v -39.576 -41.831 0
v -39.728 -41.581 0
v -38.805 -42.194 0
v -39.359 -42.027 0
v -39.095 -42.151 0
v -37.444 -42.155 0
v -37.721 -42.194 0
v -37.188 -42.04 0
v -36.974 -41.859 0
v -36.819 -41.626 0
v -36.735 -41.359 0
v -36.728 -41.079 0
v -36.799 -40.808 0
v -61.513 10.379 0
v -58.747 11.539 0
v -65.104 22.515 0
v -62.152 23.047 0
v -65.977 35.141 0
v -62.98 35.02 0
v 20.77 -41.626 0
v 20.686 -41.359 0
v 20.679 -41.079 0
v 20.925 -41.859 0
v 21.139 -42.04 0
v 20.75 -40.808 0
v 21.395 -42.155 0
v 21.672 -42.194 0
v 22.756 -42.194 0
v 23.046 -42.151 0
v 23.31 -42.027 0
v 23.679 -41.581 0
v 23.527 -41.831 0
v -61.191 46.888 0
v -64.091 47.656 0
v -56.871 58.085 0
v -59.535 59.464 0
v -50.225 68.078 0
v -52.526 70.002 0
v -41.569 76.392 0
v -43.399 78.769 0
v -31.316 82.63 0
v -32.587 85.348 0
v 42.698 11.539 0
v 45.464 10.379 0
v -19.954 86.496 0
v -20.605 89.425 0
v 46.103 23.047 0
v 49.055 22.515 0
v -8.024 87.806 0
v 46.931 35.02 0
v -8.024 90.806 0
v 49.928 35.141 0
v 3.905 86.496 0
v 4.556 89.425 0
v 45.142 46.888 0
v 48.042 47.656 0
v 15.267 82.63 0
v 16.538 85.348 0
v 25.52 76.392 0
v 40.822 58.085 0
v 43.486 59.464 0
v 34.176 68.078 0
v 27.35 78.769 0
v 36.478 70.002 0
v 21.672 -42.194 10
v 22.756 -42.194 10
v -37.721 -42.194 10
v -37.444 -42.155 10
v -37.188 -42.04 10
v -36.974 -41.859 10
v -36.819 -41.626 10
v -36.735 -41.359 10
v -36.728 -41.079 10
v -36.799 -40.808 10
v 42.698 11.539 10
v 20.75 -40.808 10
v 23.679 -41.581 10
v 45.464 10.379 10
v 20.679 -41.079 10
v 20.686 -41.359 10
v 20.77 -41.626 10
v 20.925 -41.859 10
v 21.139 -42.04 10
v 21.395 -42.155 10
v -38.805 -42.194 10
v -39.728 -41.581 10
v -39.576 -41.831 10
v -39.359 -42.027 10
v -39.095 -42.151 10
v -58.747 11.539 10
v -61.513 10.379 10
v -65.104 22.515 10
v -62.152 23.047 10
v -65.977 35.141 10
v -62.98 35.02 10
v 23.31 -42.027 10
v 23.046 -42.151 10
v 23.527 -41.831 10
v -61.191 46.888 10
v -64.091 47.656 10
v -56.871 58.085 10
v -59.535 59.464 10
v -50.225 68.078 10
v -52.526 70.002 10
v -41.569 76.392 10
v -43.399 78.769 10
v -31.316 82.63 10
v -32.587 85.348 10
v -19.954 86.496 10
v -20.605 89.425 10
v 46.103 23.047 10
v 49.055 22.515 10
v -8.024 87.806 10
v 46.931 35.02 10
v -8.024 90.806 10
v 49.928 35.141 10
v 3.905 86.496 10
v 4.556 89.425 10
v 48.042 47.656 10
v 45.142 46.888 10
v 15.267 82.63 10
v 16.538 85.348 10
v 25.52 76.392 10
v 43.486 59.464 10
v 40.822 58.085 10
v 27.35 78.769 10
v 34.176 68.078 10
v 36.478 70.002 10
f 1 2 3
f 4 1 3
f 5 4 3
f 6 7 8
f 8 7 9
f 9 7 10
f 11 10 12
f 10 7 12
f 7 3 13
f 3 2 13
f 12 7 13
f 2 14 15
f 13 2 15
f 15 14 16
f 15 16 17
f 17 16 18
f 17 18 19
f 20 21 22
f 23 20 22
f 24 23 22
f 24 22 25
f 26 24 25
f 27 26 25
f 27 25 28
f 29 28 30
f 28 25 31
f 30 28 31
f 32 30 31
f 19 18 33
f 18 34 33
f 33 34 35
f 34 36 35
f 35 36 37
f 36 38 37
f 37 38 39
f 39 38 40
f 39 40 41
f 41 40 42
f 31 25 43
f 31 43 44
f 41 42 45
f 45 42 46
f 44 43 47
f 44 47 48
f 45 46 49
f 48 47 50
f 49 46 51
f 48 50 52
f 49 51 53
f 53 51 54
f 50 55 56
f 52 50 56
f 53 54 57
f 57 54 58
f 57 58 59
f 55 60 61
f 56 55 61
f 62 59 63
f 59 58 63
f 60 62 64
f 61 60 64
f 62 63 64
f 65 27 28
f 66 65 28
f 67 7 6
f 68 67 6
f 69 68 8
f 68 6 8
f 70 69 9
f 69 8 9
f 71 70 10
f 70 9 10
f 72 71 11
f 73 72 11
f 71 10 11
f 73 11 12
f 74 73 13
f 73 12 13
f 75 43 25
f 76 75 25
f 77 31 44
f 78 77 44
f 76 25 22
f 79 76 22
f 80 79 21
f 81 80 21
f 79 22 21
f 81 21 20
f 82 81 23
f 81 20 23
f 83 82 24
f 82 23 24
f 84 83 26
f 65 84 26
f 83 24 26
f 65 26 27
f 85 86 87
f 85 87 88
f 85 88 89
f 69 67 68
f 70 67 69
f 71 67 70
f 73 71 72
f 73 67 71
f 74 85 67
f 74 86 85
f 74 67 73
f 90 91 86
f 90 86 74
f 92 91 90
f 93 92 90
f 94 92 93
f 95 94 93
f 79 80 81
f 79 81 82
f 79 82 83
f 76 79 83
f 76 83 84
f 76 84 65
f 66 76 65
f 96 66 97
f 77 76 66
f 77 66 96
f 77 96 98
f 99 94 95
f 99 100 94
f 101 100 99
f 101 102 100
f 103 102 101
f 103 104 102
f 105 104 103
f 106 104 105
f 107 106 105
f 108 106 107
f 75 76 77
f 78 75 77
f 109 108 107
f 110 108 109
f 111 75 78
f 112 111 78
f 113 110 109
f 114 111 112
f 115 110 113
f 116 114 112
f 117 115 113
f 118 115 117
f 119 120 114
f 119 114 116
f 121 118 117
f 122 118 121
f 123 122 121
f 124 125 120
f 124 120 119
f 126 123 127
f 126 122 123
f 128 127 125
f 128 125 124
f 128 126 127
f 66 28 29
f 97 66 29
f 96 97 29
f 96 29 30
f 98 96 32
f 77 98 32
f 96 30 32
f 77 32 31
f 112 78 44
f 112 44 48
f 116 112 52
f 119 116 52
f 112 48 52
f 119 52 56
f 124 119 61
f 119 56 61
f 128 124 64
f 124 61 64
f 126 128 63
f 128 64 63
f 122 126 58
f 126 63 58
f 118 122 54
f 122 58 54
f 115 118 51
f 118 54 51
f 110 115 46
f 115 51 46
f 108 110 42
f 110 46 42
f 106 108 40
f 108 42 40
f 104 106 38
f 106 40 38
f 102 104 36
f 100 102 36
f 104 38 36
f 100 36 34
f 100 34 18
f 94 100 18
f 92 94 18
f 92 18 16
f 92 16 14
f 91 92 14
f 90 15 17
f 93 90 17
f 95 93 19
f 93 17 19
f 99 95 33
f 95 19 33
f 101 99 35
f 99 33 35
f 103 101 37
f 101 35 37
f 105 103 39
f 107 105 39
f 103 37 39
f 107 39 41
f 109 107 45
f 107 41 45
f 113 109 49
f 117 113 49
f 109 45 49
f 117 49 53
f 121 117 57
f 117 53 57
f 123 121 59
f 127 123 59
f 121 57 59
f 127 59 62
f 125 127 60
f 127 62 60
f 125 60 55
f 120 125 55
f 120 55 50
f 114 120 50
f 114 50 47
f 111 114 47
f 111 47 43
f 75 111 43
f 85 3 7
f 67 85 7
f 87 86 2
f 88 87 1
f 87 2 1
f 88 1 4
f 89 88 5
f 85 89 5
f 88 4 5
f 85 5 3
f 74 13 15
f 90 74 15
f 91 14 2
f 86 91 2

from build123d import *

# Parameters (mm, degrees)
F1_DEPTH = 10


with BuildPart() as f1:
    # F0 (on Top) → F1 (new body)
    with BuildSketch(Plane.XY):
        with BuildLine():
            ThreePointArc((-58.746551, 11.539105), (-8.024476, 87.805772), (42.697599, 11.539105))
            Line((42.697599, 11.539105), (20.749777, -40.807561))
            ThreePointArc((20.749777, -40.807561), (20.83933, -41.748003), (21.671996, -42.194228))
            Line((21.671996, -42.194228), (22.756337, -42.194228))
            ThreePointArc((22.756337, -42.194228), (23.310112, -42.026894), (23.678556, -41.580895))
            Line((23.678556, -41.580895), (45.464258, 10.379105))
            ThreePointArc((45.464258, 10.379105), (-8.024476, 90.805772), (-61.513209, 10.379105))
            Line((-61.513209, 10.379105), (-39.727507, -41.580895))
            ThreePointArc((-39.727507, -41.580895), (-39.359063, -42.026894), (-38.805288, -42.194228))
            Line((-38.805288, -42.194228), (-37.720947, -42.194228))
            ThreePointArc((-37.720947, -42.194228), (-36.888281, -41.748003), (-36.798728, -40.807561))
            Line((-36.798728, -40.807561), (-58.746551, 11.539105))
        make_face()
    extrude(amount=F1_DEPTH)


solid = f1.part
